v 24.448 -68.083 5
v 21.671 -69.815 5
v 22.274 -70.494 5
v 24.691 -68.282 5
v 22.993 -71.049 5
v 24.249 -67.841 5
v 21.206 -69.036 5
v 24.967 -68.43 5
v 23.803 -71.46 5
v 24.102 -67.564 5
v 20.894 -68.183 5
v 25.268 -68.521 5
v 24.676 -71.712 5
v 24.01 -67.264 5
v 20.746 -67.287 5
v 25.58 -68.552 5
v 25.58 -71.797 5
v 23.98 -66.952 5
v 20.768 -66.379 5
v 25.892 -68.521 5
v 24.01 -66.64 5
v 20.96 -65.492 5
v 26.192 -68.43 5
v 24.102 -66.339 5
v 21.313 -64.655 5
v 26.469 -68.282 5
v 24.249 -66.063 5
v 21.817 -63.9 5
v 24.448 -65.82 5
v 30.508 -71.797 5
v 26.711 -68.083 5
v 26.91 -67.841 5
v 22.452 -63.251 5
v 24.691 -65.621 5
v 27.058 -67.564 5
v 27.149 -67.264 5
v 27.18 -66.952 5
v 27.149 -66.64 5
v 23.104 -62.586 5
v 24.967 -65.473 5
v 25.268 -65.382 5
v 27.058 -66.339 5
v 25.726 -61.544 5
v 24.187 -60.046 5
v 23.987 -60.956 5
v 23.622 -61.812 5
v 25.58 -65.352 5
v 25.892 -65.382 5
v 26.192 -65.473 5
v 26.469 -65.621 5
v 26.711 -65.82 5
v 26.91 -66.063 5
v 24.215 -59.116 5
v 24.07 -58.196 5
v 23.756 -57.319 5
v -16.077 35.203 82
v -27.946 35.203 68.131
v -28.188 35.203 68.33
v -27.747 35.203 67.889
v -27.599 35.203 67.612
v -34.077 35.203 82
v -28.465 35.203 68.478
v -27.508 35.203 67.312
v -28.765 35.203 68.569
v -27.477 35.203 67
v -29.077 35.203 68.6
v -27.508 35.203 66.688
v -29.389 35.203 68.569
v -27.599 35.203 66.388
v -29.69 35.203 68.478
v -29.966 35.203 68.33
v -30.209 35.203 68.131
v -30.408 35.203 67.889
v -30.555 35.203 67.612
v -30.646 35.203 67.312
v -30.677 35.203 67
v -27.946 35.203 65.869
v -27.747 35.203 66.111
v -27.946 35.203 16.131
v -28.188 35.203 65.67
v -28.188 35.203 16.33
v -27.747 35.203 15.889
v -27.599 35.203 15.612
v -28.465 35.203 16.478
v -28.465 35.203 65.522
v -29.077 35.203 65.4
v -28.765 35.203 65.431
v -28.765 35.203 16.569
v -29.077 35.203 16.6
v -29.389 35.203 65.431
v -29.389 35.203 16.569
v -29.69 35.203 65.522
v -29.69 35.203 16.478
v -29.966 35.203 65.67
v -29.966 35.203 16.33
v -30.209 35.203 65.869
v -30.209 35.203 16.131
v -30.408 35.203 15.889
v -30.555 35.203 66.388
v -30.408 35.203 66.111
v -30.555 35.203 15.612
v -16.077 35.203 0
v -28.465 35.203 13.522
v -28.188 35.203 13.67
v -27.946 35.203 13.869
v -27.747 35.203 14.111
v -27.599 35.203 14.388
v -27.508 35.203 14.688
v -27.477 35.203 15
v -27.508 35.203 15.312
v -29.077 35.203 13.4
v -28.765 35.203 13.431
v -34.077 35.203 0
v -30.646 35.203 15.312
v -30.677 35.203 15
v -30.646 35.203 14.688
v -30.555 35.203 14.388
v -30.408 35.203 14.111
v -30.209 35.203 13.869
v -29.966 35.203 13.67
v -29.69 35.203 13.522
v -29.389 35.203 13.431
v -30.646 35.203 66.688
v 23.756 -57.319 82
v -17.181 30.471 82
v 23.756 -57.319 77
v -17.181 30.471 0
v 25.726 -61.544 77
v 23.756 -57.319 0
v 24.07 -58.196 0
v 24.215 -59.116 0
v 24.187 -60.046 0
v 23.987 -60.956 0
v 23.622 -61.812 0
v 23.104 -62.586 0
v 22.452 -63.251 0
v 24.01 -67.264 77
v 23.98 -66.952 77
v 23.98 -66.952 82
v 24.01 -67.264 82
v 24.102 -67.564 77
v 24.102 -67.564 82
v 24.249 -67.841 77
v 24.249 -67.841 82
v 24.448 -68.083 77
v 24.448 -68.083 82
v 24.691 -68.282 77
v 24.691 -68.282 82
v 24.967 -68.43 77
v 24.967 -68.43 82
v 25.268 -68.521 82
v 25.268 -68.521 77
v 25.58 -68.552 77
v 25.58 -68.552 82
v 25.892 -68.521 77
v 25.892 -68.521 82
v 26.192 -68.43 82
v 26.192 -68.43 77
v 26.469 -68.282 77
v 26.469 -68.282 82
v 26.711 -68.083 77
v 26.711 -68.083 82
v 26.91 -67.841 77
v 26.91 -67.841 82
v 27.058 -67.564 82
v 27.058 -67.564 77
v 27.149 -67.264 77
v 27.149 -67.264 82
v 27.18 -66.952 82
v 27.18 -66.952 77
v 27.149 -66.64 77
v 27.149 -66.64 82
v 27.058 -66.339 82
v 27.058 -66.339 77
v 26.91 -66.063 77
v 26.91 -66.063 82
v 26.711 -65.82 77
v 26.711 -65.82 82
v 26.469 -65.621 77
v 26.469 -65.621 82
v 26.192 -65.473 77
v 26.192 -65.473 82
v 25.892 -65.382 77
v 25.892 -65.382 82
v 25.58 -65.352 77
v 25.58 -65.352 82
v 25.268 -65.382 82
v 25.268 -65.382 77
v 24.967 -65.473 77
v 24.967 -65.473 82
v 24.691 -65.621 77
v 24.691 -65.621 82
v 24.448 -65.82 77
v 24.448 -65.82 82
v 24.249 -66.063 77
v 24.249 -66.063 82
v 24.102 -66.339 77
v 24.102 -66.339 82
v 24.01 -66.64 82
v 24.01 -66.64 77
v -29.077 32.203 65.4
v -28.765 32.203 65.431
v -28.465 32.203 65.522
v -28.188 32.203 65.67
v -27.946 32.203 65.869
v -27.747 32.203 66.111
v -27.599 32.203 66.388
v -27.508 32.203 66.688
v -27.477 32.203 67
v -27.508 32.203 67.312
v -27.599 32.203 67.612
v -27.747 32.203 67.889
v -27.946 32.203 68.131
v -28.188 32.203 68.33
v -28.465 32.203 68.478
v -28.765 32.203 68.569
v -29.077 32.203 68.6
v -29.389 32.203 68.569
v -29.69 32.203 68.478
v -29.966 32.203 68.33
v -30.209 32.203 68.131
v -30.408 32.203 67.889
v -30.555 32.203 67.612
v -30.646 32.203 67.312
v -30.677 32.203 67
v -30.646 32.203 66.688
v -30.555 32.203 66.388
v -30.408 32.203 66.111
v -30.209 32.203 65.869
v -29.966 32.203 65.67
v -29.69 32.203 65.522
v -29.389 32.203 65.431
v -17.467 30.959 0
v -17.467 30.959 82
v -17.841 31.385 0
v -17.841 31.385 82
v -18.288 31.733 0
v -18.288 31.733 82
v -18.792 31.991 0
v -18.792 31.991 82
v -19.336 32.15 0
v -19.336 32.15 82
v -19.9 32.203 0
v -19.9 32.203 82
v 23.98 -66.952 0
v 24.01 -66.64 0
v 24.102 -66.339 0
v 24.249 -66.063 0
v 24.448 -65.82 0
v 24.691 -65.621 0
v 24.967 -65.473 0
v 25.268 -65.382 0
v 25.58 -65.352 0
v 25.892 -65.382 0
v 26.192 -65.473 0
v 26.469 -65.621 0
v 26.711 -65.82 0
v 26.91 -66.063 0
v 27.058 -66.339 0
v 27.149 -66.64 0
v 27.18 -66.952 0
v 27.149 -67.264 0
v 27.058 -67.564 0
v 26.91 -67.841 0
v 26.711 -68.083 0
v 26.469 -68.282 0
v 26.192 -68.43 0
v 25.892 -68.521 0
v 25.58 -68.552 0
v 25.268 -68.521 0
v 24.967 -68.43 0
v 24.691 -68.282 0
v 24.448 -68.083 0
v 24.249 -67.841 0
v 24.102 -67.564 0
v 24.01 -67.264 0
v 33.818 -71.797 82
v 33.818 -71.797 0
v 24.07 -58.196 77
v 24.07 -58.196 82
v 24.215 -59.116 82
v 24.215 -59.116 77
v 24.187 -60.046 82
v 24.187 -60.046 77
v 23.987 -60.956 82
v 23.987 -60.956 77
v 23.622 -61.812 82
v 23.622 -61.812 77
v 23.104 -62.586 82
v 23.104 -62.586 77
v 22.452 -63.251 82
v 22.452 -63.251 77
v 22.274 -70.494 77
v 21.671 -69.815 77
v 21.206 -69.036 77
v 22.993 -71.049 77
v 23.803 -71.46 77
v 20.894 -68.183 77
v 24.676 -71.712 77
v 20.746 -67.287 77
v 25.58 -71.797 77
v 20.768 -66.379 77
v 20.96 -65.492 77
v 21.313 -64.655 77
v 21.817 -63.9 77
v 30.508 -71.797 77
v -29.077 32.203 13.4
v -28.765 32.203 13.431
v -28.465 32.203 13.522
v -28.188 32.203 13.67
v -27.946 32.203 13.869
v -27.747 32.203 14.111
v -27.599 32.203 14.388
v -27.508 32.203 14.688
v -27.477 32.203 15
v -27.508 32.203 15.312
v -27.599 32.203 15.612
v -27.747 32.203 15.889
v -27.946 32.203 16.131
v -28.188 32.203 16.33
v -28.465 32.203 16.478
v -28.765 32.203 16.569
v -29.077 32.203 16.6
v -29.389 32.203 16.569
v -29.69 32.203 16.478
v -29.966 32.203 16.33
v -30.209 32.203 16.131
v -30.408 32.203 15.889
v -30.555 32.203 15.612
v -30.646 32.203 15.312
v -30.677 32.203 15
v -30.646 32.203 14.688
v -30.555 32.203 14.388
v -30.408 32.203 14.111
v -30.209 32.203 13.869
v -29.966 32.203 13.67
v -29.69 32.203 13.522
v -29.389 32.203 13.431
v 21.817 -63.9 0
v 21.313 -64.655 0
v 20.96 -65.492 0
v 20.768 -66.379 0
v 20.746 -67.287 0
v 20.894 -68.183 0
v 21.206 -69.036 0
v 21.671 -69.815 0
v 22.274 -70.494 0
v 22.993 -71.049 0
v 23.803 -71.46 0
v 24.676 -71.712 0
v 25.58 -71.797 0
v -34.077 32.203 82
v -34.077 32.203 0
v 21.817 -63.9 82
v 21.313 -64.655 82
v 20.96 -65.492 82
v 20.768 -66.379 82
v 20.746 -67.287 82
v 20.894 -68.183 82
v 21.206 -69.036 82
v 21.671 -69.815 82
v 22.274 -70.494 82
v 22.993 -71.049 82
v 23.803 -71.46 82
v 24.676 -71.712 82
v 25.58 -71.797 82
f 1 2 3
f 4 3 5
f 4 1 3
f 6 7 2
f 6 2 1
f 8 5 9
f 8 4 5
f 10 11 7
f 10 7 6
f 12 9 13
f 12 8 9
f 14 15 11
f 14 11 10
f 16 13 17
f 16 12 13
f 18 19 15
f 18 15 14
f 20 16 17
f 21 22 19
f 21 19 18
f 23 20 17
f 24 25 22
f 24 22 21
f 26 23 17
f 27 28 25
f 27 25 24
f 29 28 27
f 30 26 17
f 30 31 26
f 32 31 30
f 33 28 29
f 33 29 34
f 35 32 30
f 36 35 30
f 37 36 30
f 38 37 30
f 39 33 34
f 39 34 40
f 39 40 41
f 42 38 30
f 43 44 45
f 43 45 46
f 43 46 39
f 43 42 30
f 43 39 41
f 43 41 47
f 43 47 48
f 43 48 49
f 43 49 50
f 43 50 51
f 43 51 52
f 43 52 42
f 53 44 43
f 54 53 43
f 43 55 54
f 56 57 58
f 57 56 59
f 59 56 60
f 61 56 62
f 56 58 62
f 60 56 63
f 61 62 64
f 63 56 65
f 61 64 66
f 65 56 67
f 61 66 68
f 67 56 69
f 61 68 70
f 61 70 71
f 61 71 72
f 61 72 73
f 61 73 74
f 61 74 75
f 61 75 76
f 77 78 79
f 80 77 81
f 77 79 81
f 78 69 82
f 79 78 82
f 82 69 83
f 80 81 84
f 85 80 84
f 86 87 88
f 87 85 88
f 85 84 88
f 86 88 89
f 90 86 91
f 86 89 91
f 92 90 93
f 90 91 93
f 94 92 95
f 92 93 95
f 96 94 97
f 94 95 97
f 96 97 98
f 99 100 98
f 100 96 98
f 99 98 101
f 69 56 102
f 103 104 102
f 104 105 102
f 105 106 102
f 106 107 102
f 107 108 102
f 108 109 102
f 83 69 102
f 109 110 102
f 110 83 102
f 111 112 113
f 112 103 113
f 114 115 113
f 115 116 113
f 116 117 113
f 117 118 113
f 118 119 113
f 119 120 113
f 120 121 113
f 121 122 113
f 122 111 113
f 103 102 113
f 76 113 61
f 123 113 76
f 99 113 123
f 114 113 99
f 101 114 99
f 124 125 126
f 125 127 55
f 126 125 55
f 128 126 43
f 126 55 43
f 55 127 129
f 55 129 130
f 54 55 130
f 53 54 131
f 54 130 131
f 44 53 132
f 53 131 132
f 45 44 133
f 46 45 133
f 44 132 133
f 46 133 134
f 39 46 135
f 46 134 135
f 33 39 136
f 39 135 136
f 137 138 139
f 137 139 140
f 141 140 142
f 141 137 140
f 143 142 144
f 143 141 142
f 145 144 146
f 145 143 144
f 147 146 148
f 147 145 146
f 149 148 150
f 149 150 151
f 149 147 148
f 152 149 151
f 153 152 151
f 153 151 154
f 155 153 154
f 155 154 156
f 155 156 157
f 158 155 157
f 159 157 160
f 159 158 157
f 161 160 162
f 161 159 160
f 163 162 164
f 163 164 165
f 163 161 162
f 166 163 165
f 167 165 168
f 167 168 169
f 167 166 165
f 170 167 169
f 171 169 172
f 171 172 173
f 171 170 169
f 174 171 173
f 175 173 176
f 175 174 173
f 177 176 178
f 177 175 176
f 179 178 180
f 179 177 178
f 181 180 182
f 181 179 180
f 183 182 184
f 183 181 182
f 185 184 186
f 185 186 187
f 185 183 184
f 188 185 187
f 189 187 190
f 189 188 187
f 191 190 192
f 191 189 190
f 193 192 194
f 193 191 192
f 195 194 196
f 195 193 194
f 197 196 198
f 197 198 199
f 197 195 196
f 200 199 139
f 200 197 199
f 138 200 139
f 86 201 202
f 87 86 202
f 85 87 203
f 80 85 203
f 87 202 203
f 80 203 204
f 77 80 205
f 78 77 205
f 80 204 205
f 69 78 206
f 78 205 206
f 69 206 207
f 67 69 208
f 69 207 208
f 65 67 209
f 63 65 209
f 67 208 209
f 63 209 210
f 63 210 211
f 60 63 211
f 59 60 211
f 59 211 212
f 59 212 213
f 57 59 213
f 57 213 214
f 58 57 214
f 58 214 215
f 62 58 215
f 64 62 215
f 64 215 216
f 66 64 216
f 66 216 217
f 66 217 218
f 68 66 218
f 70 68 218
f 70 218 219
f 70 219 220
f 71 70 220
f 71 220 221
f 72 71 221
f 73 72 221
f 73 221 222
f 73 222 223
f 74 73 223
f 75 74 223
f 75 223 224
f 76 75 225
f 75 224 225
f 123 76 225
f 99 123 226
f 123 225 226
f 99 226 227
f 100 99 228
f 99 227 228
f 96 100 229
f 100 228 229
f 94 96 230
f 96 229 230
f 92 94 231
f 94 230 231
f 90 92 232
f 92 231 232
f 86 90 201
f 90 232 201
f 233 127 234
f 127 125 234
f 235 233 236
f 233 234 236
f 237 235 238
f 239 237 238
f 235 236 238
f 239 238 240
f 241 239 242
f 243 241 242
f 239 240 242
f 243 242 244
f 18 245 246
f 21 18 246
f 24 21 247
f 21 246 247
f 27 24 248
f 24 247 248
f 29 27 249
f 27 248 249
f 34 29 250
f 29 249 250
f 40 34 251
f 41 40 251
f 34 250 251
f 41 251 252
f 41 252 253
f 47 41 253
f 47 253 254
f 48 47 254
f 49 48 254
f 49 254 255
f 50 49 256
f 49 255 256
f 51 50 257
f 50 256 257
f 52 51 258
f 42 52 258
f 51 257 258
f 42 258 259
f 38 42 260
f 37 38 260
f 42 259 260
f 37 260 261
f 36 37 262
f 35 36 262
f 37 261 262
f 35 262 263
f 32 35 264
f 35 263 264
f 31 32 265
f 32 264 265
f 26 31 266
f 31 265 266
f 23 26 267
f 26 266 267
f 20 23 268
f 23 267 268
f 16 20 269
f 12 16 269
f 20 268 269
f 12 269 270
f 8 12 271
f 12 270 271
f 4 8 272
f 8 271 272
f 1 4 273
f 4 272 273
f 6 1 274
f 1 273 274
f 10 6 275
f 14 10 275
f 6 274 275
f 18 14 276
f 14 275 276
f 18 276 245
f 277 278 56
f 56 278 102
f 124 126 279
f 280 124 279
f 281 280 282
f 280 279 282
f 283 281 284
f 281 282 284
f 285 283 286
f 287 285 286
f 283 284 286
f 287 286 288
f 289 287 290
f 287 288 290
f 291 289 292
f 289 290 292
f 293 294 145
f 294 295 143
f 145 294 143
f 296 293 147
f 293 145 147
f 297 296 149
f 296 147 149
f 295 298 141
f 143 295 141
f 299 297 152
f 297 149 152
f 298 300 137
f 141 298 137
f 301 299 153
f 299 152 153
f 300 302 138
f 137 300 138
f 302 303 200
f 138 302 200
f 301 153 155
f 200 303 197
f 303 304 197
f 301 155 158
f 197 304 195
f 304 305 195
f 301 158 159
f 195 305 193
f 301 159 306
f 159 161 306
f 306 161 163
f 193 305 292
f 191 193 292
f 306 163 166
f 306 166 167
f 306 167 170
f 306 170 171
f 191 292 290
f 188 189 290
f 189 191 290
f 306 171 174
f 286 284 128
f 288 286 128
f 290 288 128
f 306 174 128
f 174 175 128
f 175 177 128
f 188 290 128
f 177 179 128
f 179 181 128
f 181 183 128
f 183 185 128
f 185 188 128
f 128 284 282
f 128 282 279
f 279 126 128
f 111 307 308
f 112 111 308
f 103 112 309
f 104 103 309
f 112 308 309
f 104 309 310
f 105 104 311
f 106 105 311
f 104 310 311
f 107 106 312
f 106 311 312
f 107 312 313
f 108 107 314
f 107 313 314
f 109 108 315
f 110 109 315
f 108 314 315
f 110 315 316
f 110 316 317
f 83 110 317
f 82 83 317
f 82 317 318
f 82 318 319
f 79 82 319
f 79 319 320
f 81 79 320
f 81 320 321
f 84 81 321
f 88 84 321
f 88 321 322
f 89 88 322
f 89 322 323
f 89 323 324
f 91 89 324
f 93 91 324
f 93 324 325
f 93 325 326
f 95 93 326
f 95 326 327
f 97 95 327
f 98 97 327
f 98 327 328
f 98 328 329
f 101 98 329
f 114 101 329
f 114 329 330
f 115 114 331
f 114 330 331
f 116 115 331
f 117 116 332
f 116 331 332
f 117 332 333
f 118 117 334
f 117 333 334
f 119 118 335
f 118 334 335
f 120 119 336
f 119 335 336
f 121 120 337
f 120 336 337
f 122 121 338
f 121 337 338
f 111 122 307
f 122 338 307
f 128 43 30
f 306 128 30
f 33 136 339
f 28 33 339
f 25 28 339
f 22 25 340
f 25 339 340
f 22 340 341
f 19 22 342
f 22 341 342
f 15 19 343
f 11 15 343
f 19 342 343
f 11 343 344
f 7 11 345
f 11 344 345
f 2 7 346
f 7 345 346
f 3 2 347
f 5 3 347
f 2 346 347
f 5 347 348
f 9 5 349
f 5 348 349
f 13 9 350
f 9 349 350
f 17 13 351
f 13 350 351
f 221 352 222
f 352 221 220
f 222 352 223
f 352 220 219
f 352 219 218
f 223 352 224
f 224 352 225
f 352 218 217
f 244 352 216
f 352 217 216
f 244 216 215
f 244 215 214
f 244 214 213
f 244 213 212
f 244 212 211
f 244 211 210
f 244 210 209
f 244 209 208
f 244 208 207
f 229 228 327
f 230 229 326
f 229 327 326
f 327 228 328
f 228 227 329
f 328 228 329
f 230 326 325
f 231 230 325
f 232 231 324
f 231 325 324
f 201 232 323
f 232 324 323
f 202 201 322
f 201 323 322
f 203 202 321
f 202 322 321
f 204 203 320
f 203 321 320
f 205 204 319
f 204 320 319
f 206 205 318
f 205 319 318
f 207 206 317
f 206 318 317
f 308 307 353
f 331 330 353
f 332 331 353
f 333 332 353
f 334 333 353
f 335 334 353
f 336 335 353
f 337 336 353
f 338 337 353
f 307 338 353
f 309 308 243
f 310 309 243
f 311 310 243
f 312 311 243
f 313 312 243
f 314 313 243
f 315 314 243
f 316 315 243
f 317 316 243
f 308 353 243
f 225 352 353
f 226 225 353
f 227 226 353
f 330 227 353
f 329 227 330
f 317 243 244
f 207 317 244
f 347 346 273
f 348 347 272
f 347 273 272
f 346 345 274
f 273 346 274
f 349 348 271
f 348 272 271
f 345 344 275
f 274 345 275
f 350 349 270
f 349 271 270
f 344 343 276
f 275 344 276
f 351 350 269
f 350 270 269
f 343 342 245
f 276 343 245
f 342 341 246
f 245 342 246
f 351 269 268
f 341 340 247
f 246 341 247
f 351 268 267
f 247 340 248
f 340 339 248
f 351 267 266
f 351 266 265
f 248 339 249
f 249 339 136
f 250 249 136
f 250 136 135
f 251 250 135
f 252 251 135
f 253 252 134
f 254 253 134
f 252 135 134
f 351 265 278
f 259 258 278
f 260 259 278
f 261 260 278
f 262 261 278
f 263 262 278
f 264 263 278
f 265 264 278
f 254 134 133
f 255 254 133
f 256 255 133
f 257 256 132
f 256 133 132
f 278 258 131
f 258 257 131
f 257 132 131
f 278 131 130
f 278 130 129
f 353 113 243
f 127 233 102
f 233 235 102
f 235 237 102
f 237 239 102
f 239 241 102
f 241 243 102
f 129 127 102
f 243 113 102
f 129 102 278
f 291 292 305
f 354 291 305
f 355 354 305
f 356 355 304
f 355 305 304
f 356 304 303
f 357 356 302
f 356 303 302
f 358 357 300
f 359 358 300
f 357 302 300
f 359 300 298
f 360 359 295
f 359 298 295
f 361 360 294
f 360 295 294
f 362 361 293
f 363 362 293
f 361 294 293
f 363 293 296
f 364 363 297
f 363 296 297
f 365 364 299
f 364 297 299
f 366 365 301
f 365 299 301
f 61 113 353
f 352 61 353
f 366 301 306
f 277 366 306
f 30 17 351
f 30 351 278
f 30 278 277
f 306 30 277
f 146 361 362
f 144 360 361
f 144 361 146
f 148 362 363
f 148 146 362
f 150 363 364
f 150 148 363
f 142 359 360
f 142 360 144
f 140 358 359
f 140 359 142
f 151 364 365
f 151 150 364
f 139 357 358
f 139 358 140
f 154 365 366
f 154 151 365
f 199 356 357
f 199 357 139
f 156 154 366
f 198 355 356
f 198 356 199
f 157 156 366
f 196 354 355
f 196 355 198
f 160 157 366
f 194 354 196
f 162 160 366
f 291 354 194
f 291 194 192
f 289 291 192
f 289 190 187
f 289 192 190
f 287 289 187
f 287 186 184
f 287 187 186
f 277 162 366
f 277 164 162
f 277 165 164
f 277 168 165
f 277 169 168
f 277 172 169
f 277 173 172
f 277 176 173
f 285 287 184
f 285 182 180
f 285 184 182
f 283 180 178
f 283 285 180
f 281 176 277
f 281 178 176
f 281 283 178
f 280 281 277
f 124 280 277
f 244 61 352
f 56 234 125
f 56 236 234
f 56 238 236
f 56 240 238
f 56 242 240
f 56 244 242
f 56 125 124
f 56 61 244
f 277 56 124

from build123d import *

# Parameters (mm, degrees)
EXTRUDE_1_DEPTH     = 82
SKETCH_4_R          = 1.6
CUT_EXTRUDE_1_DEPTH = 10
FILLET_1_R          = 3
SKETCH_5_R          = 1.6
EXTRUDE_2_DEPTH     = 5
EXTRUDE_START       = -5
SKETCH_6_R          = 1.6
EXTRUDE_3_DEPTH     = 5
SKETCH_7_W          = 5.946088912
SKETCH_7_H          = 0.873329624
CUT_EXTRUDE_2_DEPTH = 115.290435775


with BuildPart() as part:
    # 草图1 → 凸台-拉伸1 (new body)
    with BuildSketch(Plane.XY):
        Polygon((25.726329851, -61.543566927), (30.579717439, -71.951690196), (33.889851195, -71.951690196), (-16.077235621, 35.20307328), (-34.077235621, 35.20307328), (-34.077235621, 32.20307328), (-17.988446404, 32.20307328), align=None)
    extrude(amount=EXTRUDE_1_DEPTH)

    # 草图4 → 切除-拉伸1 (cut)
    with BuildSketch(Plane.XZ.offset(-32.20307328)):
        with Locations(Location((-29.077235621, 67, 0), (0, 0, 270))):
            Circle(SKETCH_4_R)
        with Locations(Location((-29.077235621, 15, 0), (0, 0, 270))):
            Circle(SKETCH_4_R)
    extrude(amount=-CUT_EXTRUDE_1_DEPTH, mode=Mode.SUBTRACT)

    # 圆角1
    fillet_1_edges = [part.edges().sort_by_distance(p)[0] for p in [
        (-17.988446404, 32.20307328, 41),
    ]]
    fillet(fillet_1_edges, radius=FILLET_1_R)

    # 草图5 → 凸台-拉伸2 (add)
    with BuildSketch(Plane(origin=(0, 0, 0), x_dir=(-1, 0, 0), z_dir=(0, 0, -1))):
        with BuildLine():
            Line((-25.579717439, -71.79692672), (-30.507550044, -71.79692672))
            Line((-30.507550044, -71.79692672), (-23.756384483, -57.319005451))
            ThreePointArc((-23.756384483, -57.319005451), (-24.108220381, -60.505712257), (-22.452229611, -63.250996092))
            ThreePointArc((-22.452229611, -63.250996092), (-21.029604517, -68.616859667), (-25.579717439, -71.79692672))
        make_face()
        with Locations((-25.579717439, -66.951690196)):
            Circle(SKETCH_5_R, mode=Mode.SUBTRACT)
    extrude(amount=-EXTRUDE_2_DEPTH)

    # 草图6 → 凸台-拉伸3 (add)
    with BuildSketch(Plane.XY.offset(82).offset(EXTRUDE_START)):
        with BuildLine():
            Line((25.579717439, -71.79692672), (30.507550044, -71.79692672))
            Line((30.507550044, -71.79692672), (23.756384483, -57.319005451))
            ThreePointArc((23.756384483, -57.319005451), (24.108220381, -60.505712257), (22.452229611, -63.250996092))
            ThreePointArc((22.452229611, -63.250996092), (21.029604517, -68.616859667), (25.579717439, -71.79692672))
        make_face()
        with Locations(Location((25.579717439, -66.951690196, 0), (0, 0, 180))):
            Circle(SKETCH_6_R, mode=Mode.SUBTRACT)
    extrude(amount=EXTRUDE_3_DEPTH)

    # 草图7 → 切除-拉伸2 (cut, through all)
    with BuildSketch(Plane.XY.offset(82)):
        with Locations((33.4805945, -72.233591532)):
            Rectangle(SKETCH_7_W, SKETCH_7_H)
    extrude(amount=-CUT_EXTRUDE_2_DEPTH, mode=Mode.SUBTRACT)


solid = part.part
